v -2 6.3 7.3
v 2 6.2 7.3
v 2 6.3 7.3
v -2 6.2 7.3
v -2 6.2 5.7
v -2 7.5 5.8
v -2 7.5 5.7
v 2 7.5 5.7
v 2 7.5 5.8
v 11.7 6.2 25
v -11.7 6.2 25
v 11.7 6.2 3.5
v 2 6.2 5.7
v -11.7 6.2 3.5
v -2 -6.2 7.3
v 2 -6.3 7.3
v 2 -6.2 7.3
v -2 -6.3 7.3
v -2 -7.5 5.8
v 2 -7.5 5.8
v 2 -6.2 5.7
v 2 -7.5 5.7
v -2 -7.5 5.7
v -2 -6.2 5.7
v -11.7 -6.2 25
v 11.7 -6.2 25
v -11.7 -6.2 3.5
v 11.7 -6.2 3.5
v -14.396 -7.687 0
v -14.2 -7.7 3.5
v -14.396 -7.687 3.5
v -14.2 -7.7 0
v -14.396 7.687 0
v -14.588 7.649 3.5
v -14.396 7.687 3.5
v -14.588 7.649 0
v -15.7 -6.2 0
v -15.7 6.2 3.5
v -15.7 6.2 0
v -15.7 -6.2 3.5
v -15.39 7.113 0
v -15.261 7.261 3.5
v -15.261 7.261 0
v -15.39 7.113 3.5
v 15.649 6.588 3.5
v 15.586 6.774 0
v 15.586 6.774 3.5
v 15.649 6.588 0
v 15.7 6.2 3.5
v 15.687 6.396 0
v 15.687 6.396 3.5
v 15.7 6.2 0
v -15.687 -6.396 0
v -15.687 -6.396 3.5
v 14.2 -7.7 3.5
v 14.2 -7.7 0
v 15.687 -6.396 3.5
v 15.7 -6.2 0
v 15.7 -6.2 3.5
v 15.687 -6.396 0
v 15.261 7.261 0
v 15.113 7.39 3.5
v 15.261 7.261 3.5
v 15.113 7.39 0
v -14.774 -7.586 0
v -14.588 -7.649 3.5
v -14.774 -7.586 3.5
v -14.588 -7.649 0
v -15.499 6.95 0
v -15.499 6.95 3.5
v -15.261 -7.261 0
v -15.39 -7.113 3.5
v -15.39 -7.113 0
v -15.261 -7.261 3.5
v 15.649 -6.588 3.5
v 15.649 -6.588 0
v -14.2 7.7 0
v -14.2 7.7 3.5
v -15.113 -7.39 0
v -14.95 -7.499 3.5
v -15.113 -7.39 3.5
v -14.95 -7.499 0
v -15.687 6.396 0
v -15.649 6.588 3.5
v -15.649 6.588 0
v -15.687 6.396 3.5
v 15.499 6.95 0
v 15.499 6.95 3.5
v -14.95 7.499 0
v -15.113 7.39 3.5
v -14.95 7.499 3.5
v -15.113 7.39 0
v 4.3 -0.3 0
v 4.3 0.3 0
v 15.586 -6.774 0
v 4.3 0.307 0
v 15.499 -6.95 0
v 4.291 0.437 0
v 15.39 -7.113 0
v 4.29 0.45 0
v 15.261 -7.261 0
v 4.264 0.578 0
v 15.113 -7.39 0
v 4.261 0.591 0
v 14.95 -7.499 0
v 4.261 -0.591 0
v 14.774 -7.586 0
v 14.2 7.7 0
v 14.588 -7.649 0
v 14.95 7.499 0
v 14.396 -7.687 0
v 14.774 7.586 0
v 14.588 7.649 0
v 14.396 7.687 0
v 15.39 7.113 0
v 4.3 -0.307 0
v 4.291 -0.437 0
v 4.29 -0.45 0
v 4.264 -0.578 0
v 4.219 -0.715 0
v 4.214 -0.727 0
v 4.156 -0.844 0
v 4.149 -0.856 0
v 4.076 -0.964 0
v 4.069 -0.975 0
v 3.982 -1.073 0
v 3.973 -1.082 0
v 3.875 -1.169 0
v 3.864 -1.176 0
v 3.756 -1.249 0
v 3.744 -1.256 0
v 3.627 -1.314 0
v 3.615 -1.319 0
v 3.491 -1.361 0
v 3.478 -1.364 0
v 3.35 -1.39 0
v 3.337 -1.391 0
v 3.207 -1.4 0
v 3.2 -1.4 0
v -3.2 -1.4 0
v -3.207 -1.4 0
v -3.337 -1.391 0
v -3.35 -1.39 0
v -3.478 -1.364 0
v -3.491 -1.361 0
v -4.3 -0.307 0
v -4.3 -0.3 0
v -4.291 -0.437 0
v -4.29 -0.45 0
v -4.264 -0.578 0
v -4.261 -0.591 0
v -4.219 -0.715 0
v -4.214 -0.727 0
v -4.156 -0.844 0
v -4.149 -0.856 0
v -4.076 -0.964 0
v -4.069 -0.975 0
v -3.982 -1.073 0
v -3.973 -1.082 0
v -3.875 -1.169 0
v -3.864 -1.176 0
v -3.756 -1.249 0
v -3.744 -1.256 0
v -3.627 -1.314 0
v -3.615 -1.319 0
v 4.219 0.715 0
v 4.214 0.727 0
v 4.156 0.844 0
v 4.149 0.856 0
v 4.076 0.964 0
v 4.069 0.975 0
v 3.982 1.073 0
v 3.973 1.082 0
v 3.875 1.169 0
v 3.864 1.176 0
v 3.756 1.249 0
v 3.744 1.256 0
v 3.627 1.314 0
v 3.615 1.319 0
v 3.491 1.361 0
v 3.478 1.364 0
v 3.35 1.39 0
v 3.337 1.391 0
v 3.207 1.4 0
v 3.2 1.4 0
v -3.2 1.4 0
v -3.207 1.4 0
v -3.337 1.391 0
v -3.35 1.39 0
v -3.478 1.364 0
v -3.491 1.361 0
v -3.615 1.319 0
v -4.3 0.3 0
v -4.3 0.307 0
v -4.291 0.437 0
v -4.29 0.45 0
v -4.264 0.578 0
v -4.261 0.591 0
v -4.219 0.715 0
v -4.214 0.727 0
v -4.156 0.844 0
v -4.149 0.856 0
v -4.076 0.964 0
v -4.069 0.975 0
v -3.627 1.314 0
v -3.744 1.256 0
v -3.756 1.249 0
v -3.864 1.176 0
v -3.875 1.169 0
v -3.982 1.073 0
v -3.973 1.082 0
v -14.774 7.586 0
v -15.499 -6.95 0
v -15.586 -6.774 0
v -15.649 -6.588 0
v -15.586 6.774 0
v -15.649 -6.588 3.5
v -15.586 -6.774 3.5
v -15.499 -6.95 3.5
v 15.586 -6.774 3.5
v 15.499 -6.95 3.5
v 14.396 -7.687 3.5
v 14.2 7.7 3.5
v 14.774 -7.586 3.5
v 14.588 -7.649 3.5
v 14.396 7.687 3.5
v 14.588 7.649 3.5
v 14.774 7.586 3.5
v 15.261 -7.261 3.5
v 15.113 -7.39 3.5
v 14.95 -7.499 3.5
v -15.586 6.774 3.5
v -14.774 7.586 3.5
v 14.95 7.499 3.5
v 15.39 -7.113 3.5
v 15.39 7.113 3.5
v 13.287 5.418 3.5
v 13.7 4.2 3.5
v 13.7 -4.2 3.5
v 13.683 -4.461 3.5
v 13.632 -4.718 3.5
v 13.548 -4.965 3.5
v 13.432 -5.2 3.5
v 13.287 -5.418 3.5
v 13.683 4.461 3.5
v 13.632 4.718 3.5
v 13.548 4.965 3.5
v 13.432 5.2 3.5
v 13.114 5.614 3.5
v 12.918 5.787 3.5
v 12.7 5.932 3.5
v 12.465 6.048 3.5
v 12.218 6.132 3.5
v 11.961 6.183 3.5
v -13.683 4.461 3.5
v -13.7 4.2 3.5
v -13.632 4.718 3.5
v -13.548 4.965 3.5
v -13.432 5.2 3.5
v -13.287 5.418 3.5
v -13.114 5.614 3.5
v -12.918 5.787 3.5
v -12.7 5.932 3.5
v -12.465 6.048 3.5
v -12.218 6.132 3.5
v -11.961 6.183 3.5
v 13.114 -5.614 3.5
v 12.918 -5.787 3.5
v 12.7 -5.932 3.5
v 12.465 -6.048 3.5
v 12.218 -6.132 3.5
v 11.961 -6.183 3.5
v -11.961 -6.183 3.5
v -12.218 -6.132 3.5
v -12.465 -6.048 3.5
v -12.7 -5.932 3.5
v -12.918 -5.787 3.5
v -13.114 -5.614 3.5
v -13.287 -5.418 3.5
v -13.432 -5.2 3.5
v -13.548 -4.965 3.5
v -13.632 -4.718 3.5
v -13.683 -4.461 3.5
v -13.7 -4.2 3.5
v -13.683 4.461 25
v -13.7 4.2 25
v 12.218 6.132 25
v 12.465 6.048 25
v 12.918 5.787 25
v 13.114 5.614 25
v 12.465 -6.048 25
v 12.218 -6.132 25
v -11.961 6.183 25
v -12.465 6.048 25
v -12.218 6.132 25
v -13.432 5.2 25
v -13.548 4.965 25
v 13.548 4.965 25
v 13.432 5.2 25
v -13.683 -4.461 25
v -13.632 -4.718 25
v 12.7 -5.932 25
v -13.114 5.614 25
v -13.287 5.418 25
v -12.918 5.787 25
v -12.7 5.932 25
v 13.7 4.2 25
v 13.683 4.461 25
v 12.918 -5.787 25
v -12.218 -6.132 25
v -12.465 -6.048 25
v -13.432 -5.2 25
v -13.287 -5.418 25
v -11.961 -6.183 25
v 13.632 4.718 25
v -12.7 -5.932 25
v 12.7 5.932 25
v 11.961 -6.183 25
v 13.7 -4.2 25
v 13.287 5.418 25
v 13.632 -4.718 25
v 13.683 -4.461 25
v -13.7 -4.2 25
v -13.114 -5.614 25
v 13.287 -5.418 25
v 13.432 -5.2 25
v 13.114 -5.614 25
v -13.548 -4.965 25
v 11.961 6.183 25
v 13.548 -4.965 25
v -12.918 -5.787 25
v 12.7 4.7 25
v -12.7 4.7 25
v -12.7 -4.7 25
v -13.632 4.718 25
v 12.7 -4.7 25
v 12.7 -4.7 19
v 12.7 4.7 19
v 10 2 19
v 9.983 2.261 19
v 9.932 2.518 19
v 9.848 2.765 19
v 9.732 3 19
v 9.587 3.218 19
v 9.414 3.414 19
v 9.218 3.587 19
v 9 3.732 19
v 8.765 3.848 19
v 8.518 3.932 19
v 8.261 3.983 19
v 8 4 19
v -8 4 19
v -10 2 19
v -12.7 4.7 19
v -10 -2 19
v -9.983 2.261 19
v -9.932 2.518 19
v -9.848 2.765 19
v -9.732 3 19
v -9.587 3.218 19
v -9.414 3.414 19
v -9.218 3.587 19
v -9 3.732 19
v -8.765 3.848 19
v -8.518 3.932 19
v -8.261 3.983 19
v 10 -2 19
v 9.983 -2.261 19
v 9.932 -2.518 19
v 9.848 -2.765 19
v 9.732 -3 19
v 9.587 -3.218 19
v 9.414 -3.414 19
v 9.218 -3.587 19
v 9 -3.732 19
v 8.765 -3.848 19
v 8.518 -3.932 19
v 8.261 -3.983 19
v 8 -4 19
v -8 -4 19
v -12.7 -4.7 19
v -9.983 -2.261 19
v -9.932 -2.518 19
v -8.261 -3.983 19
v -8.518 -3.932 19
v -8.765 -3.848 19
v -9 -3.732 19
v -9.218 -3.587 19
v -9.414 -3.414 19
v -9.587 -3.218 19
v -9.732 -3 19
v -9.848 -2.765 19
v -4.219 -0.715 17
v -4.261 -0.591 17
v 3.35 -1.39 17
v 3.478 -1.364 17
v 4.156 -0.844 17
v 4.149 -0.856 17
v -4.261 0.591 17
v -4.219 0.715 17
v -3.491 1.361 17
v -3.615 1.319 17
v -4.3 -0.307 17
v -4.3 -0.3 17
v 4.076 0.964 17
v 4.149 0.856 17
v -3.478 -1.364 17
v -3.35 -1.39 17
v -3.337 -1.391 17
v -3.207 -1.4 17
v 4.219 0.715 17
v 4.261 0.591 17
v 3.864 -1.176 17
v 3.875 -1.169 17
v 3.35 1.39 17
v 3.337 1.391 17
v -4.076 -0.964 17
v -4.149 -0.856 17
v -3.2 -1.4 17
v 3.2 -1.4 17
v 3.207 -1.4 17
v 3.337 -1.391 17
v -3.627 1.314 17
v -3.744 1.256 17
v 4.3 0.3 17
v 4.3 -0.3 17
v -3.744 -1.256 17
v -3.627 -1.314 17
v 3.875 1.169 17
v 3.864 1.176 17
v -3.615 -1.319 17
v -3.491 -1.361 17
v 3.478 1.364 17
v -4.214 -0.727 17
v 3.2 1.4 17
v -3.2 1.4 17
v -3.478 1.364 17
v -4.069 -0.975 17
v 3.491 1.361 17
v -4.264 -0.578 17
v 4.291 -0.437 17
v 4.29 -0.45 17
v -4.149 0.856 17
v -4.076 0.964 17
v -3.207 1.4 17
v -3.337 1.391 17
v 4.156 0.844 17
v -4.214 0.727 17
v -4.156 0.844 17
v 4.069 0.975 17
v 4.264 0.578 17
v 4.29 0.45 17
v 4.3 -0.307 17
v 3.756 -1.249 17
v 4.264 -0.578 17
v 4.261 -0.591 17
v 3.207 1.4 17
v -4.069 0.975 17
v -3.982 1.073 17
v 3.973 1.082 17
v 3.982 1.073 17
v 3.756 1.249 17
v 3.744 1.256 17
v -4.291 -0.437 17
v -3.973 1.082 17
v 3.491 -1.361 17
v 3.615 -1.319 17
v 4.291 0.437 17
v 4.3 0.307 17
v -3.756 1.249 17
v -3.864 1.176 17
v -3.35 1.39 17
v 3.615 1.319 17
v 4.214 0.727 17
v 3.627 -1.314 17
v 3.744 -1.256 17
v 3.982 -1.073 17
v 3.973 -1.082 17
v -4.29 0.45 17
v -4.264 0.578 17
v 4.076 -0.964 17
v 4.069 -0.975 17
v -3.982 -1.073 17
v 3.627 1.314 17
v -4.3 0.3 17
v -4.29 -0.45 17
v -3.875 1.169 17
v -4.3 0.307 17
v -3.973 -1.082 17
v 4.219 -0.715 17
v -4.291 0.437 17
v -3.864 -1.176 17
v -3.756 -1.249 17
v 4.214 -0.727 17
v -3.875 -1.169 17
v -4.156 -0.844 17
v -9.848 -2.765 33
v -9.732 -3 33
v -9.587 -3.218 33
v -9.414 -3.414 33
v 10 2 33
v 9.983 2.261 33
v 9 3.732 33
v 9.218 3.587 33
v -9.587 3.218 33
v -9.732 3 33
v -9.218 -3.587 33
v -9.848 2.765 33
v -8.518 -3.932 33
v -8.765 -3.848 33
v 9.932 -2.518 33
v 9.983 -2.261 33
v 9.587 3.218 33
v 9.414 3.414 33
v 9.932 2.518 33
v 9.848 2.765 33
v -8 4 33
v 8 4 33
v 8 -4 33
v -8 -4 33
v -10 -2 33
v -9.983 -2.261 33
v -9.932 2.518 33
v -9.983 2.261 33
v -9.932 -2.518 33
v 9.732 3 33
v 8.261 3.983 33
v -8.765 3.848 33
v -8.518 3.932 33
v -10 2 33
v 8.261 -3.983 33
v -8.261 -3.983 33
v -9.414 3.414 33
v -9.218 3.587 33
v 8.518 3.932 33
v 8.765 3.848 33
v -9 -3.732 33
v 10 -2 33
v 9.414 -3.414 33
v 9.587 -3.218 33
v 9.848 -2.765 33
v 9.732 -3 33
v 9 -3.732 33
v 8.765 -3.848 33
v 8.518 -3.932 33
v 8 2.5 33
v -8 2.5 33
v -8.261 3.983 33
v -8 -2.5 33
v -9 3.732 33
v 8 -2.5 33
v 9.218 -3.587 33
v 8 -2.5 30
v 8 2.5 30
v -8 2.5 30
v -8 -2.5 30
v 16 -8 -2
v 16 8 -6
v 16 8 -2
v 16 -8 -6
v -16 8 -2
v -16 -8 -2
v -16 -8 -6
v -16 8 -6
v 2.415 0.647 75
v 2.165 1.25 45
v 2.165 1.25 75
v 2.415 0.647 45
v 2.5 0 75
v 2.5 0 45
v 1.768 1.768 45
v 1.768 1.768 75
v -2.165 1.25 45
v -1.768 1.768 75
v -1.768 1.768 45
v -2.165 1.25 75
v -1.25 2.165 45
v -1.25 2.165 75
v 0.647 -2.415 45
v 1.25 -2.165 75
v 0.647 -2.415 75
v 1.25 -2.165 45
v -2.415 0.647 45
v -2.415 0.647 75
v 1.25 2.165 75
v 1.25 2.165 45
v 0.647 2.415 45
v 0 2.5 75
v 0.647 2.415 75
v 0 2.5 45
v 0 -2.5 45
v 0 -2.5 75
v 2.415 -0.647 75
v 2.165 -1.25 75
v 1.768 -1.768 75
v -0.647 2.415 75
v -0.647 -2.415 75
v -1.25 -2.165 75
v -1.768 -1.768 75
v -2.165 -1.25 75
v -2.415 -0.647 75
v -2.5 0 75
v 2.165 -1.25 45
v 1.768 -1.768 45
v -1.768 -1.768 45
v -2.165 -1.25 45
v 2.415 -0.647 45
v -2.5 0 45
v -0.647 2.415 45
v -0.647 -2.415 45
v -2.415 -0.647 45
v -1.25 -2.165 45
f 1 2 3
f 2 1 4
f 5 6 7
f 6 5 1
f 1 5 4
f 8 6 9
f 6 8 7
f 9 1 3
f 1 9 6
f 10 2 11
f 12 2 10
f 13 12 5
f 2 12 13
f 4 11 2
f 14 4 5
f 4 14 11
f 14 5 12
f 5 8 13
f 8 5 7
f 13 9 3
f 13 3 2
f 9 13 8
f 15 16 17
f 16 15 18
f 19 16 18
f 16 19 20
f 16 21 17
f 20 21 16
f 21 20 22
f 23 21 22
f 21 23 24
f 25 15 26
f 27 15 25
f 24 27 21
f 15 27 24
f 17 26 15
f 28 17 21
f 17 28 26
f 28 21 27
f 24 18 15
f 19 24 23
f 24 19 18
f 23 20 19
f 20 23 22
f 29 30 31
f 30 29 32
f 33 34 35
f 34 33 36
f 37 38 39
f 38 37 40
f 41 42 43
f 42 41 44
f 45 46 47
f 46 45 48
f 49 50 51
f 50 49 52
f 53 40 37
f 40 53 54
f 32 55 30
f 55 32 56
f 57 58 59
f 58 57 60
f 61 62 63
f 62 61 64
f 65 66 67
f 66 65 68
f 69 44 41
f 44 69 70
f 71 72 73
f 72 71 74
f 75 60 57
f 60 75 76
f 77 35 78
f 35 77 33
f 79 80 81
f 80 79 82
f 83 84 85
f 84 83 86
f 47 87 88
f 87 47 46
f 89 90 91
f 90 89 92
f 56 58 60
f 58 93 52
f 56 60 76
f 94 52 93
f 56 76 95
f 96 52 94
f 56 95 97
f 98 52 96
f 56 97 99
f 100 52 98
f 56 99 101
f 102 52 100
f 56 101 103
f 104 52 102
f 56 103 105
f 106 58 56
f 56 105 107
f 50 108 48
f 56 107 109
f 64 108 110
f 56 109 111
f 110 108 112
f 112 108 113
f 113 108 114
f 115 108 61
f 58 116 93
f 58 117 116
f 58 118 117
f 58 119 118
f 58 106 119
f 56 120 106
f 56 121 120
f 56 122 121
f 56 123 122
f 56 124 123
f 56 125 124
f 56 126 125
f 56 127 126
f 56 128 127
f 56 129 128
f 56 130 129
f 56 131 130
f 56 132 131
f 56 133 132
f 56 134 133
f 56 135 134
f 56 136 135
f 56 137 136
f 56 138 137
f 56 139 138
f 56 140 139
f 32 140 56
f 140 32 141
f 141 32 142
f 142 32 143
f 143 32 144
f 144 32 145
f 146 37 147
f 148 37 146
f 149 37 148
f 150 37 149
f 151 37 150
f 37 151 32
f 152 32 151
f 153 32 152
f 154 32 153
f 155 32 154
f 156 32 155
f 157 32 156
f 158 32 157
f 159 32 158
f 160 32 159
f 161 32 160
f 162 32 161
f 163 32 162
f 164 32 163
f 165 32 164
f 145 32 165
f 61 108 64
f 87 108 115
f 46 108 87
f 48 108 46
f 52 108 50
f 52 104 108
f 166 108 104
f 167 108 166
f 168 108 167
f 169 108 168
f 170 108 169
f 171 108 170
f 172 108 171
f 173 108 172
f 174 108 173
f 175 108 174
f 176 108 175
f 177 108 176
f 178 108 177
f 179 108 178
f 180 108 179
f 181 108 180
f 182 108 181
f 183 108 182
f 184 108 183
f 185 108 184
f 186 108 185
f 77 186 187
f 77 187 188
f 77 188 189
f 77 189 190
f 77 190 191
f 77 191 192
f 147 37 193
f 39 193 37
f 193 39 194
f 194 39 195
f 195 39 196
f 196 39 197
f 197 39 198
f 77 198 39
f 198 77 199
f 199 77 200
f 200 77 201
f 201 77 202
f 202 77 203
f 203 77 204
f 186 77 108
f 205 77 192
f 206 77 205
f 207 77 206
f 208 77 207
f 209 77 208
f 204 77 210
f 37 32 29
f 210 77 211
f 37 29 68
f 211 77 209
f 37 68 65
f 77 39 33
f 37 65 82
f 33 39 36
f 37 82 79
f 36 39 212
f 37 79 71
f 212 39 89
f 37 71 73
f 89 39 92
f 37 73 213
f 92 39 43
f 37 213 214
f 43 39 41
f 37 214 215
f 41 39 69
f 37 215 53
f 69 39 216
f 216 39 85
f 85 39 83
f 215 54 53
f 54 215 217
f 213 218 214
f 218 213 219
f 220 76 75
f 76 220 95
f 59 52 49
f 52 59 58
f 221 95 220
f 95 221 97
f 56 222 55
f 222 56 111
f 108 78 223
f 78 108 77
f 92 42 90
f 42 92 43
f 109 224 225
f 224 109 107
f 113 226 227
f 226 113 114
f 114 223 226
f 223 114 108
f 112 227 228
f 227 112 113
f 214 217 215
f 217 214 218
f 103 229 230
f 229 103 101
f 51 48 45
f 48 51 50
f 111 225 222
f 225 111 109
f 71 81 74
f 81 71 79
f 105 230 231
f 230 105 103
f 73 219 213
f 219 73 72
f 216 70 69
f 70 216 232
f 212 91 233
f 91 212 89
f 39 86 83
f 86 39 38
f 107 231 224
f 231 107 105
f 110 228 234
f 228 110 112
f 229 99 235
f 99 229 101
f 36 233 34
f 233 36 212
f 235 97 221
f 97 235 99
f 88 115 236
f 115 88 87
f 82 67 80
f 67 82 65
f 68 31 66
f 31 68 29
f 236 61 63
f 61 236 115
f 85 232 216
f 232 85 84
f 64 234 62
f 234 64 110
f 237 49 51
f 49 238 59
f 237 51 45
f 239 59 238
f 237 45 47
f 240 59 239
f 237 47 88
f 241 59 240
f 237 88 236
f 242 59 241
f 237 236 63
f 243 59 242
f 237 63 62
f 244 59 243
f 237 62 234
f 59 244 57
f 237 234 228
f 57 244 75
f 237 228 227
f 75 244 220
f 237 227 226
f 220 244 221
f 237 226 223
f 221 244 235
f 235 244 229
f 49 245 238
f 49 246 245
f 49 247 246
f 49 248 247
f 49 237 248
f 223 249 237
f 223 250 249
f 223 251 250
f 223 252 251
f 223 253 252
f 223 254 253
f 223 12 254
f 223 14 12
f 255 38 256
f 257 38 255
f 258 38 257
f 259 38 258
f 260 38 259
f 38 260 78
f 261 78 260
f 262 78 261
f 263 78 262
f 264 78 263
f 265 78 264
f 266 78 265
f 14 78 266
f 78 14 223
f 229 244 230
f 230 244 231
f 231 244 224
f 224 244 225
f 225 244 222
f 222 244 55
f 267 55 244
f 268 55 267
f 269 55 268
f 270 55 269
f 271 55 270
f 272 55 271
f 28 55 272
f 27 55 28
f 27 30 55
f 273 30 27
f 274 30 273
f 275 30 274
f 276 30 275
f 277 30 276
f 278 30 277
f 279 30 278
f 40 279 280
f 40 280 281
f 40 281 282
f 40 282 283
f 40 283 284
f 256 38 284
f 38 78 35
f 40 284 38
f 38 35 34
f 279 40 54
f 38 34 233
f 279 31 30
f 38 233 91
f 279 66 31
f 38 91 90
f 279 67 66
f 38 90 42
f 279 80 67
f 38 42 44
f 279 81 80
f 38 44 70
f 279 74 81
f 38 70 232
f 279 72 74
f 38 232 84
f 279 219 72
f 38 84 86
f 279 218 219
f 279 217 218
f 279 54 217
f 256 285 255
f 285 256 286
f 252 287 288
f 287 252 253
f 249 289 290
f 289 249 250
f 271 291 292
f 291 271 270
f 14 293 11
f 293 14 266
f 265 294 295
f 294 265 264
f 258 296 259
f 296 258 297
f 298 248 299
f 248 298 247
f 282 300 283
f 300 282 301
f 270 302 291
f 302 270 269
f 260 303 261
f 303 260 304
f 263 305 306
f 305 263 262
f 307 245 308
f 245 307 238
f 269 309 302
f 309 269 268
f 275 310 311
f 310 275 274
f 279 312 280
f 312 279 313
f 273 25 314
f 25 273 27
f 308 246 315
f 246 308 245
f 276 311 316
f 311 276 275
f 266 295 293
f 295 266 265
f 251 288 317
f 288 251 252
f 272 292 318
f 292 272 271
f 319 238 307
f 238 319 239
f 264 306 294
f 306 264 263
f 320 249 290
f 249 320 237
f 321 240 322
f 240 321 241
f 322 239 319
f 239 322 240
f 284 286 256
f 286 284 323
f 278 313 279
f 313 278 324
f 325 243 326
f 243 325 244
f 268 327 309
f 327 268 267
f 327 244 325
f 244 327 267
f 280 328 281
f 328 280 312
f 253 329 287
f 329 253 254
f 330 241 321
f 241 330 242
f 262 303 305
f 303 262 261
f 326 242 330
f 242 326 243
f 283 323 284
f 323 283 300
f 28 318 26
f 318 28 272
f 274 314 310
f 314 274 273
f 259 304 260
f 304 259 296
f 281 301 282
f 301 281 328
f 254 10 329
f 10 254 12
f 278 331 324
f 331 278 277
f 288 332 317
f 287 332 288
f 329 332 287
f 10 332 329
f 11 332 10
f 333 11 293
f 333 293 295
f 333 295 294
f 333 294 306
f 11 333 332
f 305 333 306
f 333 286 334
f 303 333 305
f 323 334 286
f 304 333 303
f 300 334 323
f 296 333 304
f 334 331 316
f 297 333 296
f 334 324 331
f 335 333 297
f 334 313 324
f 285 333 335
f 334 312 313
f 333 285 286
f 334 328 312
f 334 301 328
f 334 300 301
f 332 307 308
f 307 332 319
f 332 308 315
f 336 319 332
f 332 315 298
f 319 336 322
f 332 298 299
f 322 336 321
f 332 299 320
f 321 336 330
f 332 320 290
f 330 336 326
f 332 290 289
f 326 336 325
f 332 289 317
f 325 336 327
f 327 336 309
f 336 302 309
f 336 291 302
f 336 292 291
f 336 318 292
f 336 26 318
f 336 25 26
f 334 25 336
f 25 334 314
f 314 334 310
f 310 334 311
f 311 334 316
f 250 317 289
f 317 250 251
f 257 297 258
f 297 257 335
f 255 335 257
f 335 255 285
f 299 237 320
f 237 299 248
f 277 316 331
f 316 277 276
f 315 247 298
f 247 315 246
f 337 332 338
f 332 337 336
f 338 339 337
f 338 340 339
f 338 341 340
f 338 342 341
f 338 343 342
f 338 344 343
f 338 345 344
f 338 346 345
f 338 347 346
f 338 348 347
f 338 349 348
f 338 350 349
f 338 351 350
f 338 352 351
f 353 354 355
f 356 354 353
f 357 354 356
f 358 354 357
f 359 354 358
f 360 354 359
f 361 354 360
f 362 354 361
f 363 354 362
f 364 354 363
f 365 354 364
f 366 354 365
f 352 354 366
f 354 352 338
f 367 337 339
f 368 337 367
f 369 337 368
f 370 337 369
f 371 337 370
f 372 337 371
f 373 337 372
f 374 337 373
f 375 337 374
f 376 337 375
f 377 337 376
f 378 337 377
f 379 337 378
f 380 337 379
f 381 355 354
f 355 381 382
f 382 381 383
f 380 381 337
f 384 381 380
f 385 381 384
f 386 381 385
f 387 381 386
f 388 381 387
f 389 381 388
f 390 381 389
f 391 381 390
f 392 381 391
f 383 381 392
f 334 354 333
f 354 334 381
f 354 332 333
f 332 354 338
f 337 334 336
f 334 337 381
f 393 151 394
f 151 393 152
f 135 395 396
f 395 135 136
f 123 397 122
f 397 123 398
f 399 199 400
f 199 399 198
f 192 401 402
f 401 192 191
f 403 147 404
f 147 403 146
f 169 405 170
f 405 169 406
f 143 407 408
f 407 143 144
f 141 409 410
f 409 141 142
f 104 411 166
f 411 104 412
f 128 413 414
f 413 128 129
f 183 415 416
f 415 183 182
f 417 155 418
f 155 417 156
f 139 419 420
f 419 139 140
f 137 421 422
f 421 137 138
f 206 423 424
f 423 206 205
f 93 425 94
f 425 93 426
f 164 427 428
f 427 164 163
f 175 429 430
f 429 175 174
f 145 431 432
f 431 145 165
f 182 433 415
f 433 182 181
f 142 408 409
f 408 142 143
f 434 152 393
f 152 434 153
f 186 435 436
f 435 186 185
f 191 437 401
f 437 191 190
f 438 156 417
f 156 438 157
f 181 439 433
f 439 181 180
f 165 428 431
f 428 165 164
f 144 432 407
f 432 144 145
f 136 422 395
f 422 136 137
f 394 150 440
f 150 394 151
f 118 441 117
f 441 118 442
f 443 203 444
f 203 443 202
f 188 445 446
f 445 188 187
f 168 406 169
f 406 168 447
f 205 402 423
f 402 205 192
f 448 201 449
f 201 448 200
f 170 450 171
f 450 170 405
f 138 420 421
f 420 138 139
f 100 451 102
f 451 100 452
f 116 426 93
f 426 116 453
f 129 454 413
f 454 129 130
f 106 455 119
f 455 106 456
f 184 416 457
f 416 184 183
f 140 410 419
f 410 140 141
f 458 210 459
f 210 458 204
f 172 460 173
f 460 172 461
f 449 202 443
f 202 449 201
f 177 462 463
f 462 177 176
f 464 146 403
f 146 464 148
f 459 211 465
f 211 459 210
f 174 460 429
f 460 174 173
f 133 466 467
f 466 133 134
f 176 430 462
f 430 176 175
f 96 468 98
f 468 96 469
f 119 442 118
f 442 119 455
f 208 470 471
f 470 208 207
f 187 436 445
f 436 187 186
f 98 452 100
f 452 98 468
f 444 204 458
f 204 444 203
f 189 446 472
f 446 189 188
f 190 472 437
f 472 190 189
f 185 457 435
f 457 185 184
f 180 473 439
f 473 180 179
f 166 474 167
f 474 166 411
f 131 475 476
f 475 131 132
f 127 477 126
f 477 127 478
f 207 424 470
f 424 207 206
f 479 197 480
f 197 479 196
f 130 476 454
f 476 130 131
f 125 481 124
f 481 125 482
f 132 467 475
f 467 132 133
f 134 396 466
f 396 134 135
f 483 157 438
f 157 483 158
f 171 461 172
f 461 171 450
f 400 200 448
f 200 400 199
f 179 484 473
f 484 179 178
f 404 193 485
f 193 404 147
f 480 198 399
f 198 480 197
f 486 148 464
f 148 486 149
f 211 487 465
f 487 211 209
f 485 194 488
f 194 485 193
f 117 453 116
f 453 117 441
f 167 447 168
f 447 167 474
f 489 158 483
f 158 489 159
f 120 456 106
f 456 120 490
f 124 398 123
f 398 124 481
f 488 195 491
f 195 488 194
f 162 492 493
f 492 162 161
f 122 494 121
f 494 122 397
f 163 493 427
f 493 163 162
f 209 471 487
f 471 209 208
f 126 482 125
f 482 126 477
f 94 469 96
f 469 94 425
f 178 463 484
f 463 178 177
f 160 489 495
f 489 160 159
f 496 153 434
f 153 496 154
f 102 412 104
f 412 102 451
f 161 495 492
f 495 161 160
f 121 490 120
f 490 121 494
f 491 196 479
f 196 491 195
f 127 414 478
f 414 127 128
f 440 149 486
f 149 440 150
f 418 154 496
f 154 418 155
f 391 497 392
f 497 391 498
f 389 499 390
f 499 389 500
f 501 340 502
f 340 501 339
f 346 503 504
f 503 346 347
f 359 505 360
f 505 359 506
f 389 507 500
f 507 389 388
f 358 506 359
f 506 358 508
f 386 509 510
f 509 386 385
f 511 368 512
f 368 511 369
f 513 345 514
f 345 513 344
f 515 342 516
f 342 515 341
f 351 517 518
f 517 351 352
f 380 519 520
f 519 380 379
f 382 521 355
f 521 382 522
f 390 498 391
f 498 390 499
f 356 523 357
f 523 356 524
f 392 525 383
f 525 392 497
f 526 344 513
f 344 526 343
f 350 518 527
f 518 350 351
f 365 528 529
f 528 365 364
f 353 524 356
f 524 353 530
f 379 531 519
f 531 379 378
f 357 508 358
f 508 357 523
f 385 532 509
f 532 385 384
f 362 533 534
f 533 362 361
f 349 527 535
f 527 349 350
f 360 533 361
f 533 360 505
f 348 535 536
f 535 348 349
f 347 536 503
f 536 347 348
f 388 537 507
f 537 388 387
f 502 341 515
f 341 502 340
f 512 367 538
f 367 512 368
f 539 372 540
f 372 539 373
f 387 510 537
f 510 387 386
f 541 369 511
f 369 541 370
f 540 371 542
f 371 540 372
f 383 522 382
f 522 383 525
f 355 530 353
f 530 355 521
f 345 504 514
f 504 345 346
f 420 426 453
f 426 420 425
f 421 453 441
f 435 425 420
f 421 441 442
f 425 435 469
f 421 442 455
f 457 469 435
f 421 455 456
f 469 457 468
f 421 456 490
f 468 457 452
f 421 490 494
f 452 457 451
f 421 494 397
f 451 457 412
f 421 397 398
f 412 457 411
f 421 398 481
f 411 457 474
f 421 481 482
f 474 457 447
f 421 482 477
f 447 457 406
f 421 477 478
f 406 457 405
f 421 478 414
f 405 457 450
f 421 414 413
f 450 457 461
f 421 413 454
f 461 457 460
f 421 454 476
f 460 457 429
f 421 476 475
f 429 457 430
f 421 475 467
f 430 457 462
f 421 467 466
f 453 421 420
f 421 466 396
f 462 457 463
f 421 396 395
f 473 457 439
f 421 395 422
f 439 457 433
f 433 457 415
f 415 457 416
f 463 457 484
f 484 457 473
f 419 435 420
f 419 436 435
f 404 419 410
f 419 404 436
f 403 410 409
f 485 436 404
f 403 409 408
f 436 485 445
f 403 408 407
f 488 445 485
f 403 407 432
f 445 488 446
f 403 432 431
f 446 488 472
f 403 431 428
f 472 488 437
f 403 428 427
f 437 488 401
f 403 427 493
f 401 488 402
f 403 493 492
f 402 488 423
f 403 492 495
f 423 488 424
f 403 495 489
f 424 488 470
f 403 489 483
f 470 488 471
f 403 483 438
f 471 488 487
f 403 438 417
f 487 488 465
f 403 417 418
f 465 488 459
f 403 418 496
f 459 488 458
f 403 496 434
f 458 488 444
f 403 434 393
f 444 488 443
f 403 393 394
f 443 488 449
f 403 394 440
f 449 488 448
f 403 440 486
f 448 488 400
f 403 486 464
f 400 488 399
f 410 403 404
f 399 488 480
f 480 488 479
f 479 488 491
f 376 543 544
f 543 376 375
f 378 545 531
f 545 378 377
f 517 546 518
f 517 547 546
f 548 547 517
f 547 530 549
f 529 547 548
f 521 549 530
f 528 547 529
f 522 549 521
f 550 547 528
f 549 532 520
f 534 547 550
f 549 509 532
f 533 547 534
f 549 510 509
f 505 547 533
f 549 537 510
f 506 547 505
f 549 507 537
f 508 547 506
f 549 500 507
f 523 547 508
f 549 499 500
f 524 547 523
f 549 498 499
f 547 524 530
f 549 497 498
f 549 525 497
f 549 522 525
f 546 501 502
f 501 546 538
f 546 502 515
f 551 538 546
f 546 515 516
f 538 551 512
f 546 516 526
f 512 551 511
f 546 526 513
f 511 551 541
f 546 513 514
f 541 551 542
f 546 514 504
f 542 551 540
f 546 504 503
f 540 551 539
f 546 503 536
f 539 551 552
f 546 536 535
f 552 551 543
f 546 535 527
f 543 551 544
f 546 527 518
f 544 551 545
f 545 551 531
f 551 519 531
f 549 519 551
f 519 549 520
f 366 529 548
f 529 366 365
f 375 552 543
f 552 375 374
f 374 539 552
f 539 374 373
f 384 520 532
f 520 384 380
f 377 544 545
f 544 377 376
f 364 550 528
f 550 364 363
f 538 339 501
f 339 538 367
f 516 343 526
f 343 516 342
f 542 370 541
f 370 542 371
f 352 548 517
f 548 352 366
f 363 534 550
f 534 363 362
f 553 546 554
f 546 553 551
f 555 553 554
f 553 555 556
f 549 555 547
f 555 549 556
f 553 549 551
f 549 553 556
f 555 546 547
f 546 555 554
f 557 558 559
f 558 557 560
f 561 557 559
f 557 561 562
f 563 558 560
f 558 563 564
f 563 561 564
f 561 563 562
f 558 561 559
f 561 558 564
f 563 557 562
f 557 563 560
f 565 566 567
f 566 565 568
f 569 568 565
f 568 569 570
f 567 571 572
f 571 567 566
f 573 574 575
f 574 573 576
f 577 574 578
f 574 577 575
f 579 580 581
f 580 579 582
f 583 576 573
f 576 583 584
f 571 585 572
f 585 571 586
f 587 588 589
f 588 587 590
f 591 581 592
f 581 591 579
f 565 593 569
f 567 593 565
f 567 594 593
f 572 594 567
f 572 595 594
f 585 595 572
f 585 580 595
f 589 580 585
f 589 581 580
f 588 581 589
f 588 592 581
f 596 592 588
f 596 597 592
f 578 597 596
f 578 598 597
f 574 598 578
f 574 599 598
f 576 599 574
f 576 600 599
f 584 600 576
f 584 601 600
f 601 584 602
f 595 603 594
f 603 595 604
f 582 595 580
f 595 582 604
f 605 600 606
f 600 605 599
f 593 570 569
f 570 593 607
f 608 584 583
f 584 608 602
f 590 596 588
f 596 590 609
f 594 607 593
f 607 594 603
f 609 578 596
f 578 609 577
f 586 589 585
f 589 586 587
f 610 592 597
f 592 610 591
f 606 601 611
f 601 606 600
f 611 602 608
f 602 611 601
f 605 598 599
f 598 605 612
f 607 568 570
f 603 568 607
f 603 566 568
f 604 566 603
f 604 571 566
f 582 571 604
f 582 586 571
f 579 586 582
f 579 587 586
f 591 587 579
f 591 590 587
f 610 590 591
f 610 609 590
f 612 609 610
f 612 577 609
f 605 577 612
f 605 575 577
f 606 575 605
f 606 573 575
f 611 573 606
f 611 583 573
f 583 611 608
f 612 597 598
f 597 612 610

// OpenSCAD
// file: parameters.scad
// ============================================
// MODULAR CABLE ORGANIZER - SHARED PARAMETERS
// ============================================
// All dimensions in mm - include this in all files
// ============================================

$fn = 48;

// === TOLERANCES ===
clearance = 0.3;
port_clearance = 0.1;  // Extra clearance for port openings (reduced - 0.2 was too loose for USB-C)
wall = 1.6;

// === SLOT DIMENSIONS (2:1 aspect ratio) - scaled to 2/3 ===
slot_width = 32;  // Standard wide slot for larger connectors
slot_width_narrow = 16;  // Narrow slot for compact connectors (USB-C, micro-USB, USB-A, Lightning, 3.5mm)
slot_height = 16;  // Height is same for both wide and narrow
slot_depth = 4;  // Reduced from 6mm - less frame depth needed

// === FRAME STRUCTURE ===
frame_wall = 2.0;   // Wall between slots - 6 layers @ 0.4mm nozzle for strength
frame_border = 6;  // Increased by 10mm for mounting holes with countersink
frame_back = 2;     // Slightly thicker for snap catch strength
mount_hole_dia = 4;  // M4 mounting holes (changed from M3 for common screw sizes)
countersink_dia = 8;  // Diameter of countersink for M4 screw heads
countersink_depth = 2;  // Depth of countersink

// === DEFAULT GRID (can be overridden in individual files) ===
grid_cols = 2;
grid_rows = 2;

// === INSERT BASE DIMENSIONS ===
insert_width = slot_width - (2 * clearance);
insert_height = slot_height - (2 * clearance);
insert_base_depth = slot_depth - 0.5;

// === NARROW INSERT BASE DIMENSIONS ===
insert_width_narrow = slot_width_narrow - (2 * clearance);
insert_height_narrow = slot_height - (2 * clearance);

// === INSERT BODY (protrudes from frame) ===
insert_body_width = insert_width - 4;
insert_body_height = insert_height - 3;
insert_body_depth = 15.5;  // Standardized depth (USB-B 15.26mm + 0.25mm buffer) - all inserts same height
insert_top_thick = 1.5;  // Top platform thickness

// === NARROW INSERT BODY (protrudes from frame) ===
insert_body_width_narrow = insert_width_narrow - 4;
insert_body_height_narrow = insert_height_narrow - 3;

// === SNAP TABS (on neck/body - catch on back plate) ===
snap_tab_width = 4;
snap_tab_protrude = 1.2;  // How far tab sticks out from body
snap_tab_thick = 1.5;     // Z thickness of tab
snap_tab_offset = 2.2;      // Distance from base to tab bottom on insert (increased to clear frame)

// === CONNECTOR PORT DIMENSIONS & BODY DEPTHS ===
// Port dimensions from reference blueprints
// Body depths sized to match typical male connector lengths

// USB-C: 8.4 x 2.6mm, male connector ~9mm
usbc_w = 8.4;
usbc_h = 2.6;
usbc_r = 1.0;
usbc_body_depth = 15.5;  // Standardized depth (USB-B 15.26mm + 0.25mm buffer)
// NO RETENTION RIBS for USB-C (removed per user request)

// USB-A: 13.0 x 4.5mm (standard male USB-A height)
usba_w = 13.0;
usba_h = 4.5;  // Match actual male USB-A height
usba_r = 0.5;
usba_body_depth = 15.5;  // Standardized depth (USB-B 15.26mm + 0.25mm buffer)
usba_retention_rib_depth = 5.0;  // Distance from front (moved back 1mm so ribs don't break)
usba_retention_rib_size = 0.15;  // How far ribs protrude inward

// USB Mini: 6.9 x 3.0mm, male connector ~9mm
usb_mini_w = 6.9;
usb_mini_h = 3.0;
usb_mini_r = 0.5;
usb_mini_body_depth = 15.5;  // Standardized depth (USB-B 15.26mm + 0.25mm buffer)
usb_mini_retention_rib_depth = 3.5;  // Distance from front where retention ribs start
usb_mini_retention_rib_size = 0.125;  // Reduced to half (was 0.25)

// USB Micro-B: 7.4 x 1.8mm (wider to fit corners of trapezoid)
usb_micro_w = 7.4;  // Increased width for corners
usb_micro_h = 1.8;
usb_micro_r = 0.3;
usb_micro_body_depth = 15.5;  // Standardized depth (USB-B 15.26mm + 0.25mm buffer)
usb_micro_retention_rib_depth = 4.5;  // Distance from front (moved back 1mm so ribs don't break)
usb_micro_retention_rib_size = 0.125;  // How far ribs protrude inward

// USB-B: 8.75 x 7.78mm (standard male USB-B height)
usb_b_w = 8.75;  // Width at bottom (wider)
usb_b_h = 7.78;  // Match actual male USB-B height (reduced from 7.9)
usb_b_r = 0.6;   // Corner radius
usb_b_top_inset = 0.9;  // How much narrower the top is (creates trapezoid shape)
usb_b_body_depth = 15.5;  // Standardized depth (15.26mm connector + 0.25mm buffer)
usb_b_retention_rib_depth = 5.5;  // Distance from front (moved back 1mm so ribs don't break)
usb_b_retention_rib_size = 0.15;  // How far ribs protrude inward

// Lightning: 7.6 x 1.5mm, male connector ~8mm (measured from actual connector)
lightning_w = 7.6;
lightning_h = 1.5;
lightning_r = 0.5;
lightning_body_depth = 15.5;  // Standardized depth (USB-B 15.26mm + 0.25mm buffer)
lightning_retention_rib_depth = 4.0;  // Distance from front (moved back 1mm so ribs don't break)
lightning_retention_rib_size = 0.1;   // How far ribs protrude inward

// HDMI: 14.65 x 4.45mm (standard male HDMI height)
hdmi_w = 14.65;
hdmi_h = 4.45;  // Match actual male HDMI height
hdmi_r = 0.5;
hdmi_body_depth = 15.5;  // Standardized depth (USB-B 15.26mm + 0.25mm buffer)
hdmi_retention_rib_depth = 6.0;  // Distance from front (moved back 1mm so ribs don't break)
hdmi_retention_rib_size = 0.1;   // How far ribs protrude inward

// 3.5mm Audio Jack: standard 3.5mm (1/8") diameter
audio_jack_dia = 3.6;  // 3.5mm + 0.1mm for less snug fit
audio_jack_body_depth = 15.5;  // Standardized depth (USB-B 15.26mm + 0.25mm buffer)
// Ring positions for TRS/TRRS ribs (tip, ring1, ring2 from front)
audio_jack_ring1 = 3.5;  // First ring position from front
audio_jack_ring2 = 6.5;  // Second ring position from front

// Blank/Label: recessed area for label
label_w = 30;
label_h = 12;
label_depth = 0.8;

// Keyhole mounting slot: picture-hanger style for wall/table mounting
// The keyhole allows a round-headed screw to pass through, then lock in slot
keyhole_head_dia = 6;   // Diameter for screw head to pass through (5% narrower, fits #6-#8 wood screws)
keyhole_slot_width = 3.5; // Width of slot for screw shaft
keyhole_slot_length = 5.3; // Travel distance to lock screw in place
keyhole_depth = 2.5;      // Depth of keyhole cut (allows screw head to sit below surface)

// AC Power Plug: asymmetric holes for polarity (US 2-prong)
// Prongs are VERTICAL (tall and thin)
// Hot prong (narrower): 1.6mm wide x 6.5mm tall
// Neutral prong (wider): 1.6mm wide x 8.5mm tall (increased)
power_hot_w = 1.6;   // Width (thin dimension)
power_hot_h = 6.5;   // Height (tall dimension)
power_neutral_w = 1.6;   // Width (thin dimension)
power_neutral_h = 8.5;   // Height (tall dimension, increased from 8.1)
power_prong_spacing = 12.7;  // 0.5" center-to-center
power_body_depth = 15.5;  // Standardized depth (USB-B 15.26mm + 0.25mm buffer)

// === CALCULATED VALUES ===
frame_total_depth = frame_back + slot_depth;
grid_width = (grid_cols * slot_width) + ((grid_cols - 1) * frame_wall);
grid_height = (grid_rows * slot_height) + ((grid_rows - 1) * frame_wall);
frame_width = grid_width + (2 * frame_border);
frame_height_total = grid_height + (2 * frame_border);
insert_total_depth = insert_base_depth + insert_body_depth;
// main file
// ============================================
// UNIVERSAL CONNECTOR SYSTEM - DEMO VISUALIZATION
// ============================================
// Shows all components of the universal connector system:
// - Device adapter inserts (various connector types)
// - Universal male terminators
// - Cross-section views
// ============================================

include <insert_universal_base.scad>

// === VISUALIZATION OPTIONS ===
show_cross_section = false;  // Set true to see internal structure
show_assembly = true;        // Set true to see insert + terminator mated
show_all_types = false;      // Set true to see all adapter types

// === COLORS ===
color_insert = "SlateGray";
color_terminator = "DimGray";
color_pcb = "DarkGreen";
color_contacts = "Gold";

// === ASSEMBLY VIEW: INSERT + MATED TERMINATOR ===
module assembly_view() {
    // Frame slot visualization (ghost)
    color("LightBlue", 0.3)
    translate([0, 0, -slot_depth])
        cube([slot_width, slot_height, slot_depth], center=true);
    
    // Universal USB-C adapter insert
    color(color_insert)
        insert_universal_usbc();
    
    // Universal male terminator (plugged in)
    total_insert_depth = insert_base_depth + usbc_body_depth + uc_body_extension;
    color(color_terminator)
    translate([0, 0, total_insert_depth + 16])
    rotate([180, 0, 0])
        universal_male_terminator();
    
    // Cable visualization
    color("Black", 0.7)
    translate([0, 0, total_insert_depth + 20])
        cylinder(d=5, h=30, $fn=24);
}

// === CROSS-SECTION VIEW ===
module cross_section_view() {
    difference() {
        assembly_view();
        
        // Cut plane
        translate([0, -50, -10])
            cube([100, 100, 100]);
    }
    
    // PCB visualization (in cross-section)
    pcb_z = insert_base_depth + usbc_body_depth;
    color(color_pcb)
    translate([0, 0.1, pcb_z + pcb_cavity_depth/2])
        cube([pcb_cavity_width - 1, 0.1, pcb_cavity_depth - 1], center=true);
    
    // Contact pins visualization
    total_depth = insert_base_depth + usbc_body_depth + uc_body_extension;
    color(color_contacts)
    translate([0, 0.1, total_depth - 2])
        linear_extrude(0.1)
        for (col = [0:uc_pin_cols-1]) {
            x = (col - (uc_pin_cols-1)/2) * uc_pin_pitch;
            translate([x, 0])
                circle(d=0.6, $fn=8);
        }
}

// === ALL ADAPTER TYPES DISPLAY ===
module all_types_display() {
    spacing_x = 45;
    spacing_y = 35;
    
    // Labels (as comments in the model)
    // Row 1: Wide adapters
    translate([0, 0, 0]) {
        color(color_insert) insert_universal_usbc();
        // Label: USB-C
    }
    
    translate([spacing_x, 0, 0]) {
        color(color_insert) insert_universal_usba();
        // Label: USB-A
    }
    
    translate([spacing_x*2, 0, 0]) {
        color(color_insert) insert_universal_hdmi();
        // Label: HDMI
    }
    
    translate([spacing_x*3, 0, 0]) {
        color(color_insert) insert_universal_displayport();
        // Label: DisplayPort
    }
    
    // Row 2: Narrow adapters
    translate([0, -spacing_y, 0]) {
        color(color_insert) insert_universal_lightning_narrow();
        // Label: Lightning
    }
    
    translate([spacing_x/2, -spacing_y, 0]) {
        color(color_insert) insert_universal_audio_narrow();
        // Label: 3.5mm Audio
    }
    
    // Row 3: Universal components
    translate([spacing_x*1.5, -spacing_y, 0]) {
        color("DarkSlateGray") insert_universal_passthrough();
        // Label: Pass-Through (24-pin to 24-pin)
    }
    
    translate([spacing_x*2.5, -spacing_y, 0]) {
        color(color_terminator) universal_male_terminator();
        // Label: Universal Male Terminator
    }
    
    // Comparison: Original insert (no universal connector)
    translate([spacing_x*3.5, -spacing_y, 0]) {
        color("LightGray", 0.5) insert_usbc();
        // Label: Original Insert (for comparison)
    }
}

// === SIGNAL FLOW DIAGRAM (3D) ===
module signal_flow_demo() {
    // Shows how a cable connects through the system
    
    // 1. Device (simplified box)
    color("Navy", 0.5)
    translate([-60, 0, 8])
        cube([40, 30, 16], center=true);
    
    // 2. Original cable from device (e.g., HDMI)
    color("Black")
    translate([-35, 0, 8])
    rotate([0, 90, 0])
        cylinder(d=4, h=25, $fn=16);
    
    // 3. Universal adapter insert
    color(color_insert)
    translate([0, 0, 0])
        insert_universal_hdmi();
    
    // 4. Universal cable
    total_depth = insert_base_depth + hdmi_body_depth + uc_body_extension;
    color("Orange")
    translate([0, 0, total_depth + 5])
        cylinder(d=5, h=40, $fn=24);
    
    // 5. Universal male terminator (at other end)
    color(color_terminator)
    translate([0, 0, total_depth + 50])
        universal_male_terminator();
    
    // 6. Another adapter insert (e.g., USB-C)
    color(color_insert)
    translate([0, 0, total_depth + 50 + 20])
    rotate([180, 0, 0])
        insert_universal_usbc();
    
    // 7. Target device
    color("DarkRed", 0.5)
    translate([60, 0, total_depth + 70])
        cube([40, 30, 16], center=true);
    
    // Annotations would go here in a real diagram
}

// === MAIN RENDER ===
if (show_cross_section) {
    cross_section_view();
} else if (show_all_types) {
    all_types_display();
} else if (show_assembly) {
    assembly_view();
} else {
    // Default: signal flow demo
    signal_flow_demo();
}

// === QUICK REFERENCE ===
// To render different views, change the boolean flags above:
// - show_cross_section = true  → Internal structure view
// - show_assembly = true       → Insert + terminator mated
// - show_all_types = true      → All adapter variants
// - All false                  → Signal flow demonstration
